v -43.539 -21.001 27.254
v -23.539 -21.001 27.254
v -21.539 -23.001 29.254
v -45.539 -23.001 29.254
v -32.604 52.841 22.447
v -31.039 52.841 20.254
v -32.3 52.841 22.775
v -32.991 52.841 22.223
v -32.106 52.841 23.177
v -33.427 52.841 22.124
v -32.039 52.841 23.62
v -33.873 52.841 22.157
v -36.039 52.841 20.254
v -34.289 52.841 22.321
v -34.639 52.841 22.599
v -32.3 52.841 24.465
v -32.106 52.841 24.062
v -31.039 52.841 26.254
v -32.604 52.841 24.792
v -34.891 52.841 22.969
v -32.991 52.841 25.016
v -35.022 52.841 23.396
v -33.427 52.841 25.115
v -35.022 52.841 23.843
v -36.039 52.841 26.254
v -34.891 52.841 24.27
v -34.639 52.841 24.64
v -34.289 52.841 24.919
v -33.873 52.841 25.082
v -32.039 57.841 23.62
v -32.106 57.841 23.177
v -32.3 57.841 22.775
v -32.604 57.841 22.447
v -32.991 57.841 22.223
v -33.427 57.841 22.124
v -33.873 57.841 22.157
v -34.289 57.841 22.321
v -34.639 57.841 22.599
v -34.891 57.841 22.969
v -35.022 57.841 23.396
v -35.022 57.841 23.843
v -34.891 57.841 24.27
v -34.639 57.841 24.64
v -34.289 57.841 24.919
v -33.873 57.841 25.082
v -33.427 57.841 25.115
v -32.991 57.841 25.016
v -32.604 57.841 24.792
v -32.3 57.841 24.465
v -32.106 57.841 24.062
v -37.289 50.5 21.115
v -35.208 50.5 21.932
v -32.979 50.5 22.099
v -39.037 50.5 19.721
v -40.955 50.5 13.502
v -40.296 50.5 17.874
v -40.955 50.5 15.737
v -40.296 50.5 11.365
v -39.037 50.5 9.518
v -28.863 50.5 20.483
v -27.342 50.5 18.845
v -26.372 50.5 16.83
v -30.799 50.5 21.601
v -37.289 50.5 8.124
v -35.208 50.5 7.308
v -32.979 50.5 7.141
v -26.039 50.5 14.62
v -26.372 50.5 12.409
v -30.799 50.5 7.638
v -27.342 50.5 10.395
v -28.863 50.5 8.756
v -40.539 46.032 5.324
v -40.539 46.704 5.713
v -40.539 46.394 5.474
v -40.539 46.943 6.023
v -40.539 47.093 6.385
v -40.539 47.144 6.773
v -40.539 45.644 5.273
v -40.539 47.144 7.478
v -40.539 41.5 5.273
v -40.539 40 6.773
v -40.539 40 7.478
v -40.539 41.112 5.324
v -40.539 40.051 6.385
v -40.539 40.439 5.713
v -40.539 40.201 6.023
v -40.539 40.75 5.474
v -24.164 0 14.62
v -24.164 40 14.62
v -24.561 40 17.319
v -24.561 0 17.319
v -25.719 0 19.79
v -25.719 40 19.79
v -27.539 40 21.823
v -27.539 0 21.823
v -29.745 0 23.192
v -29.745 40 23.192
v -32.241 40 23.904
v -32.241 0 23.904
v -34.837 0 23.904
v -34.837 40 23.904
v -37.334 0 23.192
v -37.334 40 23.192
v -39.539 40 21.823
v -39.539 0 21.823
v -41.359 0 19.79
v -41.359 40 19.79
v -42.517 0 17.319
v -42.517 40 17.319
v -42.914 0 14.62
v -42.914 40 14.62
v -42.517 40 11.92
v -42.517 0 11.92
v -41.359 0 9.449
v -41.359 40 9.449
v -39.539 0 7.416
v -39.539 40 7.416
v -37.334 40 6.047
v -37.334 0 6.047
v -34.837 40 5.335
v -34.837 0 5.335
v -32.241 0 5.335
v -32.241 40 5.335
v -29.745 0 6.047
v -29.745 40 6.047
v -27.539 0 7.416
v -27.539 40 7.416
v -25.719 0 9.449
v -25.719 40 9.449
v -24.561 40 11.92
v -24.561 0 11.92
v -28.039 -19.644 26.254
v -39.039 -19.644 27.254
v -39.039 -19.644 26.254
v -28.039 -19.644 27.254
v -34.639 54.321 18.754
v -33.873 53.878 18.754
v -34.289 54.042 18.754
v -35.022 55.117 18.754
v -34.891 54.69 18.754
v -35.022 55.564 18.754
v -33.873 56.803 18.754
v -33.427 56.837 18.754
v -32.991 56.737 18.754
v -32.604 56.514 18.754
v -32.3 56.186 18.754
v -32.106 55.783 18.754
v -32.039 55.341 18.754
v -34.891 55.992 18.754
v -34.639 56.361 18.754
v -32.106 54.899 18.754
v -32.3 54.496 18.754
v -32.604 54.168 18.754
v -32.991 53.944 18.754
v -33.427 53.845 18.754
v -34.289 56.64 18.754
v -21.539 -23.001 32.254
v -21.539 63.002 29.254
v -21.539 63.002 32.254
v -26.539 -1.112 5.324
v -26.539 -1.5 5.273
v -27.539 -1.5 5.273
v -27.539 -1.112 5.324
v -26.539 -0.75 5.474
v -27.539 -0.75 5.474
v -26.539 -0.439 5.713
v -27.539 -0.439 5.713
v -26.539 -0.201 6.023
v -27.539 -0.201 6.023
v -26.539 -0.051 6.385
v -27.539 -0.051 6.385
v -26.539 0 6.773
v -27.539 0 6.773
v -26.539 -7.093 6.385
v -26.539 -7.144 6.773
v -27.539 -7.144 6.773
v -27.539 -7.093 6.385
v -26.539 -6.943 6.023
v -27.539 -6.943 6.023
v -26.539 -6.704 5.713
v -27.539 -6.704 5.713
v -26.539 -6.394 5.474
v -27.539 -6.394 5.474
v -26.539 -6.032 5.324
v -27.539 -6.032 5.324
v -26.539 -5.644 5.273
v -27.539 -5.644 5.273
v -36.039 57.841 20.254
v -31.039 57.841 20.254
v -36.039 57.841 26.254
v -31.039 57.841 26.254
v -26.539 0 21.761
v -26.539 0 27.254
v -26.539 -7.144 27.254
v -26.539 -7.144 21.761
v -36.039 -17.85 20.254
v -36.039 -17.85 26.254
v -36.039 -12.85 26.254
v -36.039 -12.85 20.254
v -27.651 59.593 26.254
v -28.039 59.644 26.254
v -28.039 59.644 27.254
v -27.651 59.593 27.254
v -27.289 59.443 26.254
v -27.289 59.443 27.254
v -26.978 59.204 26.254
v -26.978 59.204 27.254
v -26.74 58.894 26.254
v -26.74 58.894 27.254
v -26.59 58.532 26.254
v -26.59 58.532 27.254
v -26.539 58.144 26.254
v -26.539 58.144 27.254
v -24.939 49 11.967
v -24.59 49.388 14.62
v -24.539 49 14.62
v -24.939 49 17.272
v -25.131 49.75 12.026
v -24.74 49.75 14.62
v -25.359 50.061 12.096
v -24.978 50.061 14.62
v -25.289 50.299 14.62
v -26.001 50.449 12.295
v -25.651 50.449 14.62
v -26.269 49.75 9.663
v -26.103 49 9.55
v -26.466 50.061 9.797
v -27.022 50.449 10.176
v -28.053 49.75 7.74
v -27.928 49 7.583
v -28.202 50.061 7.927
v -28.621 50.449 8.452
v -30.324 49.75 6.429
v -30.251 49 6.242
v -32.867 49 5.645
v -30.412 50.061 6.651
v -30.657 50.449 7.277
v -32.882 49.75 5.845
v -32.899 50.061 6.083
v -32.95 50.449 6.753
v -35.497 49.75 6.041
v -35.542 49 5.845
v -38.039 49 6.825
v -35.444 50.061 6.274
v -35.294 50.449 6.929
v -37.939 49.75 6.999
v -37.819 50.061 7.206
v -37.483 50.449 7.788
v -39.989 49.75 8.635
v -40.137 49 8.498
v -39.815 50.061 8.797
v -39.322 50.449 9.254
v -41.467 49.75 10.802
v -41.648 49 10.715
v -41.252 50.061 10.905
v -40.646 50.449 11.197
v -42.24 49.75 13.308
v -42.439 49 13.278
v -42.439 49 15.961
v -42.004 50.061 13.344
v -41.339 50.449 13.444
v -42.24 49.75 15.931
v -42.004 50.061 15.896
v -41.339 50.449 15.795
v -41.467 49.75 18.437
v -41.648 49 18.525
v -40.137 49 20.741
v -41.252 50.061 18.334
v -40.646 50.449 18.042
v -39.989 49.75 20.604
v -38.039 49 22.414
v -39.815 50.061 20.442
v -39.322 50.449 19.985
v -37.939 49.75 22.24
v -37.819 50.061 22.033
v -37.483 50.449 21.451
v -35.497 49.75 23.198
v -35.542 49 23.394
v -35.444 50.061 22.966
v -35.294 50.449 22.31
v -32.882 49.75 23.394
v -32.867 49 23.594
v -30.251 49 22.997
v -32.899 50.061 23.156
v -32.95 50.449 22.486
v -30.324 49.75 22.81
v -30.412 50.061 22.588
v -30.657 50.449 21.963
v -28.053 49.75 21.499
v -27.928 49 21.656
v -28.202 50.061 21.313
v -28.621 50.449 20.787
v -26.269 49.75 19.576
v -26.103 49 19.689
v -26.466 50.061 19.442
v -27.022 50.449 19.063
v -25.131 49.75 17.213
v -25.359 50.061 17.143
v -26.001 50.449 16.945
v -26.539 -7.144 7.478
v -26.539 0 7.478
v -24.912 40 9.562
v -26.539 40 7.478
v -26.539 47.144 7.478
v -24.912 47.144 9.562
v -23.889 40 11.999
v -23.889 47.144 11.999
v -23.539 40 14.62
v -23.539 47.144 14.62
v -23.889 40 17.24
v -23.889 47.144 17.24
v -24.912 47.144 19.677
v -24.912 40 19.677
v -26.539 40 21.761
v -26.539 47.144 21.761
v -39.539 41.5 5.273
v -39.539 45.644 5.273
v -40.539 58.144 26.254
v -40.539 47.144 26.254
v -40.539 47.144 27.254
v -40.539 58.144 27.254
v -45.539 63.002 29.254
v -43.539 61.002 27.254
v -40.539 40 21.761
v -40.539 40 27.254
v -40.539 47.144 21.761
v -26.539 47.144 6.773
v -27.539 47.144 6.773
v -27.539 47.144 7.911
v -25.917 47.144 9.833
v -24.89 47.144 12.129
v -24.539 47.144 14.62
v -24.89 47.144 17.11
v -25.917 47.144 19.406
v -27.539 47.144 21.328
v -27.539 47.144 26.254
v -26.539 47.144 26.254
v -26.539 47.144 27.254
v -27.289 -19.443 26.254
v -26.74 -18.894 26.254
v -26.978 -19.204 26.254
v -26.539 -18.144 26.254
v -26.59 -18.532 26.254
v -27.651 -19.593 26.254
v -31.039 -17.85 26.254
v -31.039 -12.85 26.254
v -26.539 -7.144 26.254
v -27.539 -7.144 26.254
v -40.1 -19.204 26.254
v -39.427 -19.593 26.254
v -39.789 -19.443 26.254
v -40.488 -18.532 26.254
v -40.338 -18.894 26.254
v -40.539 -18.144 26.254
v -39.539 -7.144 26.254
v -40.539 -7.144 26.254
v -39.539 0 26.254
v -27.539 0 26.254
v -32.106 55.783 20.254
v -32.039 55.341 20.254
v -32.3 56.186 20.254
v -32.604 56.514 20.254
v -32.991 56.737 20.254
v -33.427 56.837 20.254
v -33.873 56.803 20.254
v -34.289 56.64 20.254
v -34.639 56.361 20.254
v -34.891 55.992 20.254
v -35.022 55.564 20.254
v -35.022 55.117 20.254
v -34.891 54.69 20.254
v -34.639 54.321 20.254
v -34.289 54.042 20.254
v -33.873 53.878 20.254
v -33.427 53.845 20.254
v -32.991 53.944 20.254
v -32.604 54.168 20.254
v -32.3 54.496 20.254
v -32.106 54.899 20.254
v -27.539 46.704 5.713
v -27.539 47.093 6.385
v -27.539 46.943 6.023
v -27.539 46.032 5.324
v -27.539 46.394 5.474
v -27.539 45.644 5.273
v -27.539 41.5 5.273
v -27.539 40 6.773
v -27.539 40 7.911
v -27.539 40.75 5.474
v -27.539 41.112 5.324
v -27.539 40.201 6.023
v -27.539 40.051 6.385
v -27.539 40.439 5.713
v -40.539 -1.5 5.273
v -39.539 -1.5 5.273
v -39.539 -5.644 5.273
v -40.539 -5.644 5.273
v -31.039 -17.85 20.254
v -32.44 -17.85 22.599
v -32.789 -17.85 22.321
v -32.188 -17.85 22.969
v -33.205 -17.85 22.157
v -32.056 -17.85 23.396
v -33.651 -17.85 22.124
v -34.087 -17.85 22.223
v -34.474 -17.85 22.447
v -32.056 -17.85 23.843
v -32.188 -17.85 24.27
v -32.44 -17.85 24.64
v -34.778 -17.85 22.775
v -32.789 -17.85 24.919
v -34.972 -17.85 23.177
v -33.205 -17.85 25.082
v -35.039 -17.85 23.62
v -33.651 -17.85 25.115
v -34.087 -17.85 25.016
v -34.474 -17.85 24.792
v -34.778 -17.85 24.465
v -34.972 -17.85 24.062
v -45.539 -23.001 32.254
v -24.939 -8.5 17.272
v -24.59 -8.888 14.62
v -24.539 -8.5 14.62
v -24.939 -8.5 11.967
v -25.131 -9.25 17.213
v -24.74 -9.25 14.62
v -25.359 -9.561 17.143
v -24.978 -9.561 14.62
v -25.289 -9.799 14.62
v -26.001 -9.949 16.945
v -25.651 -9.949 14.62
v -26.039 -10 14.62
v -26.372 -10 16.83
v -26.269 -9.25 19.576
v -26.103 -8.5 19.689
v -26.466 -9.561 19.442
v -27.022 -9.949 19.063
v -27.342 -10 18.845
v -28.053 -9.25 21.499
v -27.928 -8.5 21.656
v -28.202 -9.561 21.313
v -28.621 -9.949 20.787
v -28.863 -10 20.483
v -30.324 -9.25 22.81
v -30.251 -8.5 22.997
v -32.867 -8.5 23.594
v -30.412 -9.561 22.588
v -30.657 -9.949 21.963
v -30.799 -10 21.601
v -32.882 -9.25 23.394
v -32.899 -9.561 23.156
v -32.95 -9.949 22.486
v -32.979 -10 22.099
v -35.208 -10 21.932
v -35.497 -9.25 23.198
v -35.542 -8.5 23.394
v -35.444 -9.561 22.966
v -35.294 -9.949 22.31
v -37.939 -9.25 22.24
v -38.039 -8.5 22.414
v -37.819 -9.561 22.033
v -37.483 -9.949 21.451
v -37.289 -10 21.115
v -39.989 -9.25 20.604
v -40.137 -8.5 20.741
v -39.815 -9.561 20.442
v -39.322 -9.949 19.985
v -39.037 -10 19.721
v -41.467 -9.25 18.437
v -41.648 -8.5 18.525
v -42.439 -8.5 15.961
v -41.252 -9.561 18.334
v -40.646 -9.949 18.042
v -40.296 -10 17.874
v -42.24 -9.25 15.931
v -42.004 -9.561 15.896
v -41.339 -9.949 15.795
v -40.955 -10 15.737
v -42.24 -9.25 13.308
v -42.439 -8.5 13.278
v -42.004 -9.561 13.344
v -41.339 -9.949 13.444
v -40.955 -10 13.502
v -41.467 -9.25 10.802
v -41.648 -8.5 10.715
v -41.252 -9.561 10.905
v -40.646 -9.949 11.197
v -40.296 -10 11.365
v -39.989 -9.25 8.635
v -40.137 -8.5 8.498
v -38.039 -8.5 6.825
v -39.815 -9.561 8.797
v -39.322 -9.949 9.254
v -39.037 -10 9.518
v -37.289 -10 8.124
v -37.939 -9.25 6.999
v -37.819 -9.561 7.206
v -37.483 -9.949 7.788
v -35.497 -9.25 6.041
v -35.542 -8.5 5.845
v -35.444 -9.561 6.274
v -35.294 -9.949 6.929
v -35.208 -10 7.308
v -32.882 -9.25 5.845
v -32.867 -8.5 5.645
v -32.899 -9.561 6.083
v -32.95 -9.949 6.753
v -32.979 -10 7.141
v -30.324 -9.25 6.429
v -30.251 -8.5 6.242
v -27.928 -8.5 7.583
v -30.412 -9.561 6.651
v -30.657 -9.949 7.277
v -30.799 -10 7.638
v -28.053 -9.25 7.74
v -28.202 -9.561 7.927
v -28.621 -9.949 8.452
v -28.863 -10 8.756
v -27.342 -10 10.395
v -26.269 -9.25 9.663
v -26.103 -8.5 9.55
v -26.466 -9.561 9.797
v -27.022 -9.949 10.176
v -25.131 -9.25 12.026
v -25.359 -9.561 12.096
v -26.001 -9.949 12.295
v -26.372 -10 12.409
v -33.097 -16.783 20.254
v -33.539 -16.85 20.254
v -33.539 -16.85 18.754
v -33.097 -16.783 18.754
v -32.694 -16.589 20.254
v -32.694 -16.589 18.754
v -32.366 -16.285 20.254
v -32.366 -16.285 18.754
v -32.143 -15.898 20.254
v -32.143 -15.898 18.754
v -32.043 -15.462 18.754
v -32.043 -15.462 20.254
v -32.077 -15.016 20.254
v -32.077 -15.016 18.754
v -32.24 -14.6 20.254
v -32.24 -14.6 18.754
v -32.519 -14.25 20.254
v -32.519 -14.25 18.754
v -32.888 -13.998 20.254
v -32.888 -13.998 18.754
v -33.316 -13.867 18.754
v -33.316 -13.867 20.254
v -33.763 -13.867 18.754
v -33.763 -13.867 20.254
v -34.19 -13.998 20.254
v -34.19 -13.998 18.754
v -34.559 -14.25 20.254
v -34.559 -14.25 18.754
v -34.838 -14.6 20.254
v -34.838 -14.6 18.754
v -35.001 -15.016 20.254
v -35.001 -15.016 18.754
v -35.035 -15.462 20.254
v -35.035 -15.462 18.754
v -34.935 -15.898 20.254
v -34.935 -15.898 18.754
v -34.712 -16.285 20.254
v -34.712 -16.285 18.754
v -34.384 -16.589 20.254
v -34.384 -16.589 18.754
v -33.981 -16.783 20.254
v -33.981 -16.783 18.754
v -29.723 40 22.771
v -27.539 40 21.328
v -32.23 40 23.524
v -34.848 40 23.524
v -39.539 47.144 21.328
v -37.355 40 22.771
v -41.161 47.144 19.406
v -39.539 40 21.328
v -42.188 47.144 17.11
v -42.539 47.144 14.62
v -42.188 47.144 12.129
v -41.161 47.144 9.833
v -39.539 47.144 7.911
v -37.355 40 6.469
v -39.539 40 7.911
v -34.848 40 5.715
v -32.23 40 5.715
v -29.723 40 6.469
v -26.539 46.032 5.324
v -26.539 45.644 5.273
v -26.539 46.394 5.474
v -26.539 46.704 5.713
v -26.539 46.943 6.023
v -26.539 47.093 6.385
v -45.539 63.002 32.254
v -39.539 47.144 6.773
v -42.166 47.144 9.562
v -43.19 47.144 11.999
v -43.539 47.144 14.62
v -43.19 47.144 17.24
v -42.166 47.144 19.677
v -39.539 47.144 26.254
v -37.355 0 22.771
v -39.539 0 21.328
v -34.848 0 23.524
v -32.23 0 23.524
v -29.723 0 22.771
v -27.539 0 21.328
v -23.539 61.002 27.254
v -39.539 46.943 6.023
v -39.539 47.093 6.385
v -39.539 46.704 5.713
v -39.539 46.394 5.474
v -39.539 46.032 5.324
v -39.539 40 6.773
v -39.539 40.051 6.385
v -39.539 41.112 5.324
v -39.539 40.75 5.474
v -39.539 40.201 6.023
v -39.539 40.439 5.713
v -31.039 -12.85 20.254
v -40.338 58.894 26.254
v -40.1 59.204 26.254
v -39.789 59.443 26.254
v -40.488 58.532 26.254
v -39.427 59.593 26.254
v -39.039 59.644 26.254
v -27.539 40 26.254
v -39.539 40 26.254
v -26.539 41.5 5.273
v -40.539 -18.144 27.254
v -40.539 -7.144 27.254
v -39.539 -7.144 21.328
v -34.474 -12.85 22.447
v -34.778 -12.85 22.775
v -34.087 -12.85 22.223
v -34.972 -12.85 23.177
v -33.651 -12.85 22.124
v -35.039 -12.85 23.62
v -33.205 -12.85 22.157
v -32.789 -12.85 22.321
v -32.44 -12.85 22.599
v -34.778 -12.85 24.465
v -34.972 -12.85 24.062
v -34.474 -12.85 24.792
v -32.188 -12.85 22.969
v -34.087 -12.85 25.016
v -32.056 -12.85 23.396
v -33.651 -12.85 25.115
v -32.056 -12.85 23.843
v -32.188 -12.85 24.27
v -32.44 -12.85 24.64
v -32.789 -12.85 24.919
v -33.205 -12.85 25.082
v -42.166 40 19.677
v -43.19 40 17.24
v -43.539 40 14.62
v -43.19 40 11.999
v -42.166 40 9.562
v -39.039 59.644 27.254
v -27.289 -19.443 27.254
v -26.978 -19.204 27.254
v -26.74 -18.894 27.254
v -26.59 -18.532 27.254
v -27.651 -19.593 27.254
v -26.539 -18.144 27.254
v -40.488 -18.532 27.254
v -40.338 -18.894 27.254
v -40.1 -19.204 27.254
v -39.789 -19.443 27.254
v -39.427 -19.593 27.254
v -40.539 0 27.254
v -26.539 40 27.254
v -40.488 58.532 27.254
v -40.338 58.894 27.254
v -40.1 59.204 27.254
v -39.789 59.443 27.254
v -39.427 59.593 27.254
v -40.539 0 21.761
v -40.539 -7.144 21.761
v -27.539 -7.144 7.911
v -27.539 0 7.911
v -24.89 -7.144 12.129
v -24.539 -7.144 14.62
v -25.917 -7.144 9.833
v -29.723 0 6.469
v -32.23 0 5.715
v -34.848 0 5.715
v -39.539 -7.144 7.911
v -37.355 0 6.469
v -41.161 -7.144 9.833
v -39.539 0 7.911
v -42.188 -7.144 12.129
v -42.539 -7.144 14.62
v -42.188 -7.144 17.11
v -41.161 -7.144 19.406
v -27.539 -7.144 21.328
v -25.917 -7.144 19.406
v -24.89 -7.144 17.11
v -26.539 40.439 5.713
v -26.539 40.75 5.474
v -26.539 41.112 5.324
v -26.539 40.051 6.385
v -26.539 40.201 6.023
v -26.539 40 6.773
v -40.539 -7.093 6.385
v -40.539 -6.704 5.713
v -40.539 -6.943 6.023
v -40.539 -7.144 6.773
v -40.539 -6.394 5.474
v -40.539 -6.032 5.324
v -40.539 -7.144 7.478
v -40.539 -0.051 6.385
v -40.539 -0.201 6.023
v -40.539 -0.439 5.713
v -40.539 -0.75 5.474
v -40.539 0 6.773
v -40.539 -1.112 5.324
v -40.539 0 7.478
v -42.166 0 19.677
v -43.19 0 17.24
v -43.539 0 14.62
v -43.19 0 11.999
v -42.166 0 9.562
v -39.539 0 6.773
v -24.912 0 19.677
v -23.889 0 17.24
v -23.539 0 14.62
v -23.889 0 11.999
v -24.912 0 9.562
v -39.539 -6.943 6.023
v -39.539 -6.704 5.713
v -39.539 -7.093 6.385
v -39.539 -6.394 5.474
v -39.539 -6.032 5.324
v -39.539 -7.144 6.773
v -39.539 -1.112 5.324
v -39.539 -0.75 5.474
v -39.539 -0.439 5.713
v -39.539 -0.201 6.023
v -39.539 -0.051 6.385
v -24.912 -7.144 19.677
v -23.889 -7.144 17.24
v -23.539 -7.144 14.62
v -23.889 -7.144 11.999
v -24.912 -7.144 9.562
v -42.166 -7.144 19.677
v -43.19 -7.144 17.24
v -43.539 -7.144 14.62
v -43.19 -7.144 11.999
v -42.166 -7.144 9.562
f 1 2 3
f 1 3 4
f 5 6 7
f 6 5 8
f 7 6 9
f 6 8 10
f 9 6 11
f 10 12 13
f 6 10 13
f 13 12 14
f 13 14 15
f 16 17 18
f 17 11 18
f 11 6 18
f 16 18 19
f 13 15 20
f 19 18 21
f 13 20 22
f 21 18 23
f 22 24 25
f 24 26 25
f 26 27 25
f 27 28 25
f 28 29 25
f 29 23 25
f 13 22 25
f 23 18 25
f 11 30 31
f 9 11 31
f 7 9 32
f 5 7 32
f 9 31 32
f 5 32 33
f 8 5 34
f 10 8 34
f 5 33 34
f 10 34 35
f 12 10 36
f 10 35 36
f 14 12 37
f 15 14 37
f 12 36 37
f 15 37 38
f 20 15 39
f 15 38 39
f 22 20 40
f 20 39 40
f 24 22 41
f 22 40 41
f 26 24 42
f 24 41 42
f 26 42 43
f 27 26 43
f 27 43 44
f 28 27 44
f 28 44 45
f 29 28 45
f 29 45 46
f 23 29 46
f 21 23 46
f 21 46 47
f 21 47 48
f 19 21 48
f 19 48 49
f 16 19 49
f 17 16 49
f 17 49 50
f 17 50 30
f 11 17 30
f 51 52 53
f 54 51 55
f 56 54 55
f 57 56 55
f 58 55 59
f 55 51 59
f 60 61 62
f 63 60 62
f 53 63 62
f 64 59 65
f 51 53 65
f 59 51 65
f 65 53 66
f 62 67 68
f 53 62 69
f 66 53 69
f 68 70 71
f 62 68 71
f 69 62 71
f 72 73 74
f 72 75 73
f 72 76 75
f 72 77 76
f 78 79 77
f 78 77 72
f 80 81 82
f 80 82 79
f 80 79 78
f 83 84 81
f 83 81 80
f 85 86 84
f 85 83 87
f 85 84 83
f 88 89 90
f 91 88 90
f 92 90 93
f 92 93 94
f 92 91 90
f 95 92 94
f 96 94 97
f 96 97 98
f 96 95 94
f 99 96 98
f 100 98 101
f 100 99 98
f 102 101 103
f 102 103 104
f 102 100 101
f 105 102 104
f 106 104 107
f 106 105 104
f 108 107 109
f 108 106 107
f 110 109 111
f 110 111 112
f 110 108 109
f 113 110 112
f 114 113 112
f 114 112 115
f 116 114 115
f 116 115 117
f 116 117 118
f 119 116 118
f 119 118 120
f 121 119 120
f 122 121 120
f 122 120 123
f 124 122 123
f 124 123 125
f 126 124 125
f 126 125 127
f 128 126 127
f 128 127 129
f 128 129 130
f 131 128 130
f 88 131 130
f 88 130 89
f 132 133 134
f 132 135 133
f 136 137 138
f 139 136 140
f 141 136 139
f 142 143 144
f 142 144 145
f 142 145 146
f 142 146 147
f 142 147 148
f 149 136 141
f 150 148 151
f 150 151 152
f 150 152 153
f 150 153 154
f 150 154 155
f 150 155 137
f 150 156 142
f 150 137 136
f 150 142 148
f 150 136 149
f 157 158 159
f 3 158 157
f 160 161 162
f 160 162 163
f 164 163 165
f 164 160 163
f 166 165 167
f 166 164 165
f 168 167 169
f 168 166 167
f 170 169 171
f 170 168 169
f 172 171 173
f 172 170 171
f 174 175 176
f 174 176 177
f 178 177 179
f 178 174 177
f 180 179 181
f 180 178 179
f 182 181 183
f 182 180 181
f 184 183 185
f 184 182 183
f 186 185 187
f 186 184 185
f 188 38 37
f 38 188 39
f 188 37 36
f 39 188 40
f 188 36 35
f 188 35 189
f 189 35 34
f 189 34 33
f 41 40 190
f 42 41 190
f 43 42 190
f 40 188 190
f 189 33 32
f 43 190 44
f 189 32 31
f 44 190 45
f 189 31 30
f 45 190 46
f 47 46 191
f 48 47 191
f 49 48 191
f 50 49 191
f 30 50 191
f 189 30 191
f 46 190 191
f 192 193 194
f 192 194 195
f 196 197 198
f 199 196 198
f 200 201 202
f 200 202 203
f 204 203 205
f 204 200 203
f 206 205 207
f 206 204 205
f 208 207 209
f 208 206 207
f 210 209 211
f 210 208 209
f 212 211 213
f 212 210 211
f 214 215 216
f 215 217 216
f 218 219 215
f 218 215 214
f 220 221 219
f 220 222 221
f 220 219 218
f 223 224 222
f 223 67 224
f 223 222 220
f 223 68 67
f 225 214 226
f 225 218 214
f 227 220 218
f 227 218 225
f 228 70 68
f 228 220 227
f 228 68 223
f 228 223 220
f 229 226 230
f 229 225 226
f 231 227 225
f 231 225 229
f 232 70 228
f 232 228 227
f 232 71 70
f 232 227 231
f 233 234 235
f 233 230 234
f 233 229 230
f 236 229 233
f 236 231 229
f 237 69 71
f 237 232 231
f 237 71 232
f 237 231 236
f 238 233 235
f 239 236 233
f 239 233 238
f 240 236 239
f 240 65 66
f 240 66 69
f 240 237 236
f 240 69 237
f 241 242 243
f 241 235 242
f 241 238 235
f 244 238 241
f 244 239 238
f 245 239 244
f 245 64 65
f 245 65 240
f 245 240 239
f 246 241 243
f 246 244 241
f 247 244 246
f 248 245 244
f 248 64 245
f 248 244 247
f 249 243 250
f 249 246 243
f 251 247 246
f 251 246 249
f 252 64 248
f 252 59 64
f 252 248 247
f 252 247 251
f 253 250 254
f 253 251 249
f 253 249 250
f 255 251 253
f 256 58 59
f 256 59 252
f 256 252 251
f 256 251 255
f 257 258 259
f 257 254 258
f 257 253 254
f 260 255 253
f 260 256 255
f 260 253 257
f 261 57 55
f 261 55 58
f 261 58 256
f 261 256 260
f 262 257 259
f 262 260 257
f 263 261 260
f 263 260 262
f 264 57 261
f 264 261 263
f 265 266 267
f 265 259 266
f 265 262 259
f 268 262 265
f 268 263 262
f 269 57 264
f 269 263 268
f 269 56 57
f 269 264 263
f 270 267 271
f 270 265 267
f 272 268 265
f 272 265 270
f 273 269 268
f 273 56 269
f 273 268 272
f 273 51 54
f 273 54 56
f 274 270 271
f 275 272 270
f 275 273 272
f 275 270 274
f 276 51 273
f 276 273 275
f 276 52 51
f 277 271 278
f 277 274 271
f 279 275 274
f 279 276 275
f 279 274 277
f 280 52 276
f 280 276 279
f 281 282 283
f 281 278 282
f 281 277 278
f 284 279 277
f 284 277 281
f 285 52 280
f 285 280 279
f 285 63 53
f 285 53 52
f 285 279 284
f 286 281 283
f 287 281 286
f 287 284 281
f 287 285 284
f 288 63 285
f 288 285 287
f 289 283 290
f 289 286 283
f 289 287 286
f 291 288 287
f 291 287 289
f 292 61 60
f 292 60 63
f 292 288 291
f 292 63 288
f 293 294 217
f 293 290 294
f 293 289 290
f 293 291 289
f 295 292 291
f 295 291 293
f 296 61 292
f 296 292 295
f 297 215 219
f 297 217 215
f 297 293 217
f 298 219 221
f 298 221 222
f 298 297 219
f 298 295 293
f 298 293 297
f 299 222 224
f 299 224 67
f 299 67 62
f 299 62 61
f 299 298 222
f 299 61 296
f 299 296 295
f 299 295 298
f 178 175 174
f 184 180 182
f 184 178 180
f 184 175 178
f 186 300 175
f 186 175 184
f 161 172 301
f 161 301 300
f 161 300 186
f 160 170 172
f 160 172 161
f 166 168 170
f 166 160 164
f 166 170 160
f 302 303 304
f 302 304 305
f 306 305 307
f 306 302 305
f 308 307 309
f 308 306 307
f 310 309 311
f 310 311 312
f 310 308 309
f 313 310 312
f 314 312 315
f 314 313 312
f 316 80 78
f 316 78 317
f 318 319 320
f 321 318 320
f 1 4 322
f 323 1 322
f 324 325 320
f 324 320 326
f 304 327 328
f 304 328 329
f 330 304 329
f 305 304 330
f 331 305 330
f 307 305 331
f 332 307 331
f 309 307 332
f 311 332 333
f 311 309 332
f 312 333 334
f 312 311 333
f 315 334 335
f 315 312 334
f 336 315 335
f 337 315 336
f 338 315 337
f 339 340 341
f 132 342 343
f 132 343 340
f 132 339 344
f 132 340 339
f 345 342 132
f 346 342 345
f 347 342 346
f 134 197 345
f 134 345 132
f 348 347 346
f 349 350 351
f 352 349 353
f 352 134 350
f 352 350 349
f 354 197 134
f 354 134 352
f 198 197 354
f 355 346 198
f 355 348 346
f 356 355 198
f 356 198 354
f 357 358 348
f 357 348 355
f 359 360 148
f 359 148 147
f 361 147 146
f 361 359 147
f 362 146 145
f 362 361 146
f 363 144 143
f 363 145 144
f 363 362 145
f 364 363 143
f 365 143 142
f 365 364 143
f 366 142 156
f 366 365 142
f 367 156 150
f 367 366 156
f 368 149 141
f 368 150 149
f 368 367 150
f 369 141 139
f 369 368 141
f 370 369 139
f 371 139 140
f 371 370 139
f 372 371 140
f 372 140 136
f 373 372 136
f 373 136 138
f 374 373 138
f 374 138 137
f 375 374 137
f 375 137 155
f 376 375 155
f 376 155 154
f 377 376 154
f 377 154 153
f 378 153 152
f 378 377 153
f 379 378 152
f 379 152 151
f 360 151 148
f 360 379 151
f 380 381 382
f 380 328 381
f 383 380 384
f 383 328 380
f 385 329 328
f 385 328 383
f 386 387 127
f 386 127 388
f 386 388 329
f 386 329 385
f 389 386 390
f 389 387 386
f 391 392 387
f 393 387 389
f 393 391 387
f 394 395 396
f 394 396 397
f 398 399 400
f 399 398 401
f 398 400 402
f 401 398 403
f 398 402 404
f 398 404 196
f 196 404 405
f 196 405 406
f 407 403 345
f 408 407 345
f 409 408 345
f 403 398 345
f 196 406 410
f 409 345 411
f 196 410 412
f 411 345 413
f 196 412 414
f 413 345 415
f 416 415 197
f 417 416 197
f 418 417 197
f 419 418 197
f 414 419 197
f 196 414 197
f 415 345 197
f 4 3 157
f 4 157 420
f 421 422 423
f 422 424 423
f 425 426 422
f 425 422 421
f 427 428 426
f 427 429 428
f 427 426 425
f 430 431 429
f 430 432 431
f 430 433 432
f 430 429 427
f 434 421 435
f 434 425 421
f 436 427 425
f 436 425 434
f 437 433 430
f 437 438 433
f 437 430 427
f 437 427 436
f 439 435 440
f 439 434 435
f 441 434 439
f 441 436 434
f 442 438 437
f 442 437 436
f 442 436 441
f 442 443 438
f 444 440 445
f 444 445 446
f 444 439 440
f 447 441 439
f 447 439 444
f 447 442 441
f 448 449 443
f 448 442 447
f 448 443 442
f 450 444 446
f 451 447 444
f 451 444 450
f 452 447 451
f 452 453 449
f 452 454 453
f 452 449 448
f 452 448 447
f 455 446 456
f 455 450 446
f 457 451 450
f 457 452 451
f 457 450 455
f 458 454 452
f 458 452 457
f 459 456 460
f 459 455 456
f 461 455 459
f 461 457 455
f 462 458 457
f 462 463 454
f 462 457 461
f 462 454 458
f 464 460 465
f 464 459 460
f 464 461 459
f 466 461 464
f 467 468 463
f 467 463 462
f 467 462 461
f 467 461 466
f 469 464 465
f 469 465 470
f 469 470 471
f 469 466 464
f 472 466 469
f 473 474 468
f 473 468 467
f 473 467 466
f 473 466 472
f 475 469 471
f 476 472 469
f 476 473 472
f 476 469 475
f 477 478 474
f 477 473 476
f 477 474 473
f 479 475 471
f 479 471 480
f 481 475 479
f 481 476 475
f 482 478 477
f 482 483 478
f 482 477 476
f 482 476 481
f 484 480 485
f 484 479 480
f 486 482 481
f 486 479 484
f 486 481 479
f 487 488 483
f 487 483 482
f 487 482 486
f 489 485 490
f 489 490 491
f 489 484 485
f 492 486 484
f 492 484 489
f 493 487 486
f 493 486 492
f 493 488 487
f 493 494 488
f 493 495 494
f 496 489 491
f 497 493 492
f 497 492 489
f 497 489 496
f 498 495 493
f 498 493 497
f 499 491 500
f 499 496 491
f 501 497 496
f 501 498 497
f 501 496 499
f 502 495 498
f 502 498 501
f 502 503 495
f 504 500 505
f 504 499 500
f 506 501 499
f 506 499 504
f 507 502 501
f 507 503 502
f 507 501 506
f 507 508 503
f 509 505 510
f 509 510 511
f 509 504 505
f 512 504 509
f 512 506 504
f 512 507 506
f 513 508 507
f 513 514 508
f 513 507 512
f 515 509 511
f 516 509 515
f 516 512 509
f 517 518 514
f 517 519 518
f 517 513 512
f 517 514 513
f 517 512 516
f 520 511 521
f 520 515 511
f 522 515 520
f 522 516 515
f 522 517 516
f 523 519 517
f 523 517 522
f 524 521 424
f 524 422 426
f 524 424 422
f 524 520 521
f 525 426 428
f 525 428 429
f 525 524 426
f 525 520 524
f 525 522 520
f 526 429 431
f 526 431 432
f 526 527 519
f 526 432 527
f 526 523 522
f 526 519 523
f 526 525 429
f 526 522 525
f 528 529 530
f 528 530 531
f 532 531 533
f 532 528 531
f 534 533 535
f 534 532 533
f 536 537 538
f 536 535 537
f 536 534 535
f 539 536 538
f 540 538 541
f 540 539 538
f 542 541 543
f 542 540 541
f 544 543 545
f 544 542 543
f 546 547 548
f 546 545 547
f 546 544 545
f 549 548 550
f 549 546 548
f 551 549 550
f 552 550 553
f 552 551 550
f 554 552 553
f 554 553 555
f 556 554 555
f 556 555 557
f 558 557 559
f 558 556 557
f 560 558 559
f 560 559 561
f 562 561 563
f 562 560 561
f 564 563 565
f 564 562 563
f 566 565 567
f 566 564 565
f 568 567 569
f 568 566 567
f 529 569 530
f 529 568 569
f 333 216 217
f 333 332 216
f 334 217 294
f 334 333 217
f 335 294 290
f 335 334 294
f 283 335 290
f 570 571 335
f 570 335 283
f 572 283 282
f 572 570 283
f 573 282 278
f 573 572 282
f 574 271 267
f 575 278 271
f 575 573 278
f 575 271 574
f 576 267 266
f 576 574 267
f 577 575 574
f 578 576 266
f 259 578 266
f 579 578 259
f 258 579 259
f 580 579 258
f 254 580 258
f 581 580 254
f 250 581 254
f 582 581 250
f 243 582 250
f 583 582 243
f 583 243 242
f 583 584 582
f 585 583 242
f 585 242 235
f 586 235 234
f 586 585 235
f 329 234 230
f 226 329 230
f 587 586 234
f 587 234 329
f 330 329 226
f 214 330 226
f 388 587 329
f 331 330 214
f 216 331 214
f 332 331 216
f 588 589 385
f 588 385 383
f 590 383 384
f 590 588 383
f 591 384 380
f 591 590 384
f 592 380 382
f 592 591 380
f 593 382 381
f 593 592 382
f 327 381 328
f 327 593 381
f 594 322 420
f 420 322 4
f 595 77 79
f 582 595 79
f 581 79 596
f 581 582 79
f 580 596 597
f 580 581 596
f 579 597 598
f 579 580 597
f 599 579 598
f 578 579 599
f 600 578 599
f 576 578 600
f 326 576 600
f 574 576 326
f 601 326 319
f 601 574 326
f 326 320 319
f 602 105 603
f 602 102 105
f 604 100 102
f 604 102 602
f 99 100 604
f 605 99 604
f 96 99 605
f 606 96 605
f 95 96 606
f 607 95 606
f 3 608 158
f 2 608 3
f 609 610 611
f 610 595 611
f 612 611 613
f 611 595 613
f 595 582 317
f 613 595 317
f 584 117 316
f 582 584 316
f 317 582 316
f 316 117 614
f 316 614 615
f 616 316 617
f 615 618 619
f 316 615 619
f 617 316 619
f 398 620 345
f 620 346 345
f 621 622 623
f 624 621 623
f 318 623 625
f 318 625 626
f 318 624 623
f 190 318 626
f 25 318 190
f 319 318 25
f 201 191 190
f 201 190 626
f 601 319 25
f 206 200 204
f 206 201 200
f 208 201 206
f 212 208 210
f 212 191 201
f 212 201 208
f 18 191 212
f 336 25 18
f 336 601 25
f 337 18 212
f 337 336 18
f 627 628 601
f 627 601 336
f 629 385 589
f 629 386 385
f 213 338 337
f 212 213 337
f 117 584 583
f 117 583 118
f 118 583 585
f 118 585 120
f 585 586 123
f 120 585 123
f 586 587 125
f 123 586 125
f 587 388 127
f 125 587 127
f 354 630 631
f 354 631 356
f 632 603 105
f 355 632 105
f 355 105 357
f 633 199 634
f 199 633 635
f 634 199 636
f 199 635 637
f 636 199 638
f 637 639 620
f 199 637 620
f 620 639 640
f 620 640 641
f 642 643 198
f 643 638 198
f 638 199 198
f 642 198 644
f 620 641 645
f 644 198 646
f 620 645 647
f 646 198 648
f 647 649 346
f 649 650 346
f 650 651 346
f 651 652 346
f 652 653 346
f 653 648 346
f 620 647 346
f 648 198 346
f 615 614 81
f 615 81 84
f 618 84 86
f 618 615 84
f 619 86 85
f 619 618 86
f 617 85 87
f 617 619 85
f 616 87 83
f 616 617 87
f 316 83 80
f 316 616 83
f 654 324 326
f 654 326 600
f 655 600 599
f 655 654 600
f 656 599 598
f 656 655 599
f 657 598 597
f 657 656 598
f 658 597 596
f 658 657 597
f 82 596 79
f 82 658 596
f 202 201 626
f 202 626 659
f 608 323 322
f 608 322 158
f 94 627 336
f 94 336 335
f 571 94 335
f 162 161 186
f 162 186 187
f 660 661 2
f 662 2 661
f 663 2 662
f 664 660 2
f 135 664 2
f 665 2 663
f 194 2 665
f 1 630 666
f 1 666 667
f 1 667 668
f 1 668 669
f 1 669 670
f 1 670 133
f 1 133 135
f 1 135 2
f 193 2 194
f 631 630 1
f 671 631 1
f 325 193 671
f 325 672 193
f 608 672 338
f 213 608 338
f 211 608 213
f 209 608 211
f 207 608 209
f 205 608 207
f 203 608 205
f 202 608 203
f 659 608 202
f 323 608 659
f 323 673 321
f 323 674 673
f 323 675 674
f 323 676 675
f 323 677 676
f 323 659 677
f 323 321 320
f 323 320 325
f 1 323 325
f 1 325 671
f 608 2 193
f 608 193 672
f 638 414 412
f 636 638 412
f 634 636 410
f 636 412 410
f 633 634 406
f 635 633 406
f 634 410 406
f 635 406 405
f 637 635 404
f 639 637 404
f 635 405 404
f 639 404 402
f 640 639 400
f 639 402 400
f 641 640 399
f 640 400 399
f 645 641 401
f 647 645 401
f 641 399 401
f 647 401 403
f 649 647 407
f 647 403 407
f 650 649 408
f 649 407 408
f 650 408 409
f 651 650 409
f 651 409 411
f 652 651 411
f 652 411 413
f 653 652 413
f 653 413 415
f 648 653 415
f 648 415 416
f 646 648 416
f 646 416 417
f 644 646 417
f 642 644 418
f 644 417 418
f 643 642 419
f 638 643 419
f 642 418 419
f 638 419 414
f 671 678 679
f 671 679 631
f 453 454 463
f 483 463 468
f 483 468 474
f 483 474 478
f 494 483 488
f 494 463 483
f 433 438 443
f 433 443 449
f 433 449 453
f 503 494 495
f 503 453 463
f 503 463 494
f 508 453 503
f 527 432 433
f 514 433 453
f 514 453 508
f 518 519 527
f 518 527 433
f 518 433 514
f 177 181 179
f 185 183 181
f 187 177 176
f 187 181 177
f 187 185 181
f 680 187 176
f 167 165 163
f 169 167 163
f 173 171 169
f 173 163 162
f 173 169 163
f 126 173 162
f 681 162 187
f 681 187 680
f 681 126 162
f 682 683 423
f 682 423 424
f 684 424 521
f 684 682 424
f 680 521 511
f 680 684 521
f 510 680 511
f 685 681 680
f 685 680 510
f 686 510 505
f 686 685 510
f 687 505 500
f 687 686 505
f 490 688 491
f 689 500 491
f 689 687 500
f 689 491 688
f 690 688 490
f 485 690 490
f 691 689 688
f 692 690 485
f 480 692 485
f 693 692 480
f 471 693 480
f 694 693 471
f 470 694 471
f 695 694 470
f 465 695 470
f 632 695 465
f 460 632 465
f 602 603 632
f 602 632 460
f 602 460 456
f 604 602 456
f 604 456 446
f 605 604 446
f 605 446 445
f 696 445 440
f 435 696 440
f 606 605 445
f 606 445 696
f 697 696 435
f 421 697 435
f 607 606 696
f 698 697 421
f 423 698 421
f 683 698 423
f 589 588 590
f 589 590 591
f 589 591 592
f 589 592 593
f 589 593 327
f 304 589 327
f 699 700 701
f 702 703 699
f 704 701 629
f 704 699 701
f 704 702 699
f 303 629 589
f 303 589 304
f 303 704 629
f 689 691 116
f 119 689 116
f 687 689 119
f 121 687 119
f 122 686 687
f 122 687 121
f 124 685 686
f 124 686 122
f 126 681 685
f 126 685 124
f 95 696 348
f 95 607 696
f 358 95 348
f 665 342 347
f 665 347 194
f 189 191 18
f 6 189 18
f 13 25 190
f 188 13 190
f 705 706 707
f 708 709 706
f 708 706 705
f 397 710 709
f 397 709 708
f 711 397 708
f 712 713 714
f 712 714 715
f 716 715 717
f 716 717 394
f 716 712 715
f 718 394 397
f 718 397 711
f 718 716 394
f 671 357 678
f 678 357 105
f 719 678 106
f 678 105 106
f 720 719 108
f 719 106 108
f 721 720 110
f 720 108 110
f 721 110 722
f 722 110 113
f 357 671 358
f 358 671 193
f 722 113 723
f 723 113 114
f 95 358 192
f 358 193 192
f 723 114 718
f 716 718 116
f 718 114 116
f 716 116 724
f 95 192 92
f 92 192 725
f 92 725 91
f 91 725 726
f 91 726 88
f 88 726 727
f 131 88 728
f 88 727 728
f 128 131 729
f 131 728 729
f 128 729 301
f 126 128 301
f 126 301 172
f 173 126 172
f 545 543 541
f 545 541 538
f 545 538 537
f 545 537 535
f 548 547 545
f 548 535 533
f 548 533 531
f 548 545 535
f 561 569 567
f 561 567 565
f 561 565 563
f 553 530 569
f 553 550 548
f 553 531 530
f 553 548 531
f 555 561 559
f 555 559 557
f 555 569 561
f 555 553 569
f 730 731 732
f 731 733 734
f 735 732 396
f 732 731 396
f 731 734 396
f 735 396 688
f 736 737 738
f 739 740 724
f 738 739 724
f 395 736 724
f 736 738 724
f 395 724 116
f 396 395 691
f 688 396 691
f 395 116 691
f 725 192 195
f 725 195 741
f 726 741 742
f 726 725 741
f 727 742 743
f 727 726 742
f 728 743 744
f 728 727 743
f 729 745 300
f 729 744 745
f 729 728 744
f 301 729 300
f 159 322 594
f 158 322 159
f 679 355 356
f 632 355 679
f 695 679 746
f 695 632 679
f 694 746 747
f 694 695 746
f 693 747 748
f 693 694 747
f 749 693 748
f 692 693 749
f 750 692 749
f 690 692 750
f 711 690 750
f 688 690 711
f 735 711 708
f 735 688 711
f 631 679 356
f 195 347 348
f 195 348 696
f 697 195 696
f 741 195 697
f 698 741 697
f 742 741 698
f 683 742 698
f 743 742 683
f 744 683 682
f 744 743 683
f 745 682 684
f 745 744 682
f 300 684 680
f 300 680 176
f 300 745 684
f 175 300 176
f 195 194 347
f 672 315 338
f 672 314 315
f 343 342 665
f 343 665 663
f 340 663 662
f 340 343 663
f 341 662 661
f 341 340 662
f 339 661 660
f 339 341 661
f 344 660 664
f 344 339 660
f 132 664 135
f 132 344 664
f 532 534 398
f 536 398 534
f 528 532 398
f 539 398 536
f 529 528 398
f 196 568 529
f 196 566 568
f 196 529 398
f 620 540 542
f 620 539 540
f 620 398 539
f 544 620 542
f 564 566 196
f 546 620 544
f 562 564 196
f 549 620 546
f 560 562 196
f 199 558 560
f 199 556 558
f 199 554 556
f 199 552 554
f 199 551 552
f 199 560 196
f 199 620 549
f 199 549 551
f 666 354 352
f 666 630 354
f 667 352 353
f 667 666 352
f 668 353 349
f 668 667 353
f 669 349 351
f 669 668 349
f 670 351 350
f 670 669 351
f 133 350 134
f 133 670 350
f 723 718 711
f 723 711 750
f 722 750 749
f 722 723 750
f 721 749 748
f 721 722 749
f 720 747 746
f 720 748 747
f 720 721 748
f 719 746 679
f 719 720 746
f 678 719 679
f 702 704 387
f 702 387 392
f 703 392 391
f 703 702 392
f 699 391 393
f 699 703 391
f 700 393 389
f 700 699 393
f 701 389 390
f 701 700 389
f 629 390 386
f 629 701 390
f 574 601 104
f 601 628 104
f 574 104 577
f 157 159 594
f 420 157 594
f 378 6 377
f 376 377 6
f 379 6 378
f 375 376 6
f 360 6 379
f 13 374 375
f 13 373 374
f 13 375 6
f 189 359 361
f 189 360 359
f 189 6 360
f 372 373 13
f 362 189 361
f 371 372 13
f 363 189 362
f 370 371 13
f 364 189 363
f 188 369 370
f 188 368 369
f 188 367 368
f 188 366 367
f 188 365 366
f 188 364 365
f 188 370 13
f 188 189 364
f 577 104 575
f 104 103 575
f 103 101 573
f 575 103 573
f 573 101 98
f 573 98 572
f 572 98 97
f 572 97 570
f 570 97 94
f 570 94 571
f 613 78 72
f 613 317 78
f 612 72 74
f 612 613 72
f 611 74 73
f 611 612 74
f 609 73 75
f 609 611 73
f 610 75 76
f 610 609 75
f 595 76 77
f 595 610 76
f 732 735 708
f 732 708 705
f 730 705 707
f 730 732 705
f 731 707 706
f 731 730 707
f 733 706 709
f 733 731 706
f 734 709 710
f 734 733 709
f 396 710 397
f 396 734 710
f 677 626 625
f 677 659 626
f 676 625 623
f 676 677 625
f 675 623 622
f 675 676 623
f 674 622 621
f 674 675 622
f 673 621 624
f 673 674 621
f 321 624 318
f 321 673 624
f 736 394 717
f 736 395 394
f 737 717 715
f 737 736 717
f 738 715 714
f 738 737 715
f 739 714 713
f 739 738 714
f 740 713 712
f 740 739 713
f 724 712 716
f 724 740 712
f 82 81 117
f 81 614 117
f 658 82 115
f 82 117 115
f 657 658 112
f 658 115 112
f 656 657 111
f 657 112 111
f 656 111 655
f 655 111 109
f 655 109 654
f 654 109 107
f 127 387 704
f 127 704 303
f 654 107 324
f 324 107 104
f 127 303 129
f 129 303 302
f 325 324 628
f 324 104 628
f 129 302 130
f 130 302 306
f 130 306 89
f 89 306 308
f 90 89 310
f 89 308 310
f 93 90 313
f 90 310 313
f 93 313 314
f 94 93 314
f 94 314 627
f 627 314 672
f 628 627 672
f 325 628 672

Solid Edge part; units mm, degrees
sketch "Sketch1" plane through (0, 0, 0) normal (0, -1, 0) x (1, 0, 0)
  circle A0 centre (-33.5391, 14.6196) radius 9.375
extrude "Protrusion1" add sketch "Sketch1" against normal blind 40
sketch "Sketch2" plane through (-33.5391, 0, 14.6196) normal (0, -1, 0) x (1, 0, 0)
  circle A0 centre (0, 0) radius 9
extrude "ExtrudedProtrusion_2" add sketch "Sketch2" along normal blind 10 and the other way blind 50.5
fillet "Round_1" radius 1.5 2 edges at (-42.5391, -10, 14.6196) (-42.5391, 50.5, 14.6196)
sketch "Sketch3" plane through (-33.5391, 40, 14.6196) normal (0, 1, 0) x (1, 0, 0)
  line L0 (-6, -11.6345) -> (-6, -6.7082)
  arc A0 (-6, -6.7082) -> (-6, 6.7082) centre (0, 0) cw
  line L1 (-6, 6.7082) -> (-6, 9.3463)
  line L2 (-7, 9.3463) -> (-6, 9.3463)
  line L3 (-7, 7.1414) -> (-7, 9.3463)
  arc A1 (-7, -7.1414) -> (-7, 7.1414) centre (0, 0) cw
  line L4 (-7, -12.6345) -> (-7, -7.1414)
  line L5 (7, -12.6345) -> (-7, -12.6345)
  line L6 (7, -7.1414) -> (7, -12.6345)
  arc A2 (7, 7.1414) -> (7, -7.1414) centre (0, 0) cw
  line L7 (7, 9.3463) -> (7, 7.1414)
  line L8 (6, 9.3463) -> (7, 9.3463)
  line L9 (6, 6.7082) -> (6, 9.3463)
  line L10 (6, -11.6345) -> (6, -6.7082)
  line L11 (-6, -11.6345) -> (6, -11.6345)
  arc A3 (6, 6.7082) -> (6, -6.7082) centre (0, 0) cw
extrude "ExtrudedProtrusion_3" add sketch "Sketch3" along normal blind 7.1438
sketch "Sketch4" plane through (-33.5391, 47.1437, 16.2637) normal (0, 1, 0) x (1, 0, 0)
  line L0 (7, -9.9904) -> (-7, -9.9904)
  line L1 (-7, -9.9904) -> (-7, -10.9904)
  line L2 (-7, -10.9904) -> (7, -10.9904)
  line L3 (7, -10.9904) -> (7, -9.9904)
extrude "ExtrudedProtrusion_4" add sketch "Sketch4" along normal blind 12.5
fillet "Round_2" radius 1.5 6 edges at (-40.0391, 47.1437, 5.2733) (-40.0391, 40, 5.2733) (-27.0391, 40, 5.2733) (-27.0391, 47.1437, 5.2733) (-26.5391, 59.6437, 26.7541) (-40.5391, 59.6437, 26.7541)
mirror "Mirror1" about plane through (0, 20, 0) normal (0, -1, 0) of "ExtrudedProtrusion_4", "ExtrudedProtrusion_3"
fillet "Round1" radius 1.5 6 edges at (-40.0391, -7.1438, 5.2733) (-40.0391, 0, 5.2733) (-27.0391, 0, 5.2733) (-27.0391, -7.1438, 5.2733) (-26.5391, -19.6437, 26.7541) (-40.5391, -19.6437, 26.7541)
sketch "Sketch5" plane through (-33.5391, 49.8219, 27.2541) normal (0, 0, 1) x (1, 0, 0)
  line L0 (12, 13.1801) -> (12, -72.823)
  line L1 (12, -72.823) -> (-12, -72.823)
  line L2 (-12, 13.1801) -> (-12, -72.823)
  line L3 (-12, 13.1801) -> (12, 13.1801)
  dimension "D1" = 24
extrude "ExtrudedProtrusion_7" add sketch "Sketch5" along normal blind 5
chamfer "Chamfer_1" distance 2 angle 45 4 edges at (-33.5391, 63.002, 27.2541) (-45.5391, 20.0004, 27.2541) (-33.5391, -23.0011, 27.2541) (-21.5391, 20.0004, 27.2541)
sketch "Sketch6" plane through (-33.5391, 49.8219, 26.2541) normal (0, 0, -1) x (0, -1, 0)
  line L0 (62.6717, 2.5) -> (62.6717, -2.5)
  line L1 (62.6717, -2.5) -> (67.6717, -2.5)
  line L2 (67.6717, -2.5) -> (67.6717, 2.5)
  line L3 (67.6717, 2.5) -> (62.6717, 2.5)
  line L4 (-8.0189, 2.5) -> (-8.0189, -2.5)
  line L5 (-8.0189, -2.5) -> (-3.0189, -2.5)
  line L6 (-3.0189, -2.5) -> (-3.0189, 2.5)
  line L7 (-3.0189, 2.5) -> (-8.0189, 2.5)
extrude "ExtrudedProtrusion_8" add sketch "Sketch6" along normal blind 6
sketch "Sketch7" plane through (0, 59.6437, 0) normal (0, -1, 0) x (1, 0, 0)
  circle A0 centre (-33.5391, 23.6196) radius 1.5
extrude "Cutout1" cut sketch "Sketch7" along normal up to next
sketch "Sketch8" plane through (-33.5391, 55.3408, 20.2541) normal (0, 0, -1) x (1, 0, 0)
  circle A0 centre (0, 0) radius 1.5
extrude "ExtrudedProtrusion_9" add sketch "Sketch8" along normal blind 1.5
sketch "Sketch9" plane through (-33.5391, -17.8499, 23.2541) normal (0, -1, 0) x (-1, 0, 0)
  circle A0 centre (0, -0.3655) radius 1.5
extrude "Cutout2" cut sketch "Sketch9" against normal up to next
sketch "Sketch10" plane through (-33.5391, -15.3499, 20.2541) normal (0, 0, -1) x (0, -1, 0)
  circle A0 centre (0, 0) radius 1.5
extrude "ExtrudedProtrusion_10" add sketch "Sketch10" along normal blind 1.5
